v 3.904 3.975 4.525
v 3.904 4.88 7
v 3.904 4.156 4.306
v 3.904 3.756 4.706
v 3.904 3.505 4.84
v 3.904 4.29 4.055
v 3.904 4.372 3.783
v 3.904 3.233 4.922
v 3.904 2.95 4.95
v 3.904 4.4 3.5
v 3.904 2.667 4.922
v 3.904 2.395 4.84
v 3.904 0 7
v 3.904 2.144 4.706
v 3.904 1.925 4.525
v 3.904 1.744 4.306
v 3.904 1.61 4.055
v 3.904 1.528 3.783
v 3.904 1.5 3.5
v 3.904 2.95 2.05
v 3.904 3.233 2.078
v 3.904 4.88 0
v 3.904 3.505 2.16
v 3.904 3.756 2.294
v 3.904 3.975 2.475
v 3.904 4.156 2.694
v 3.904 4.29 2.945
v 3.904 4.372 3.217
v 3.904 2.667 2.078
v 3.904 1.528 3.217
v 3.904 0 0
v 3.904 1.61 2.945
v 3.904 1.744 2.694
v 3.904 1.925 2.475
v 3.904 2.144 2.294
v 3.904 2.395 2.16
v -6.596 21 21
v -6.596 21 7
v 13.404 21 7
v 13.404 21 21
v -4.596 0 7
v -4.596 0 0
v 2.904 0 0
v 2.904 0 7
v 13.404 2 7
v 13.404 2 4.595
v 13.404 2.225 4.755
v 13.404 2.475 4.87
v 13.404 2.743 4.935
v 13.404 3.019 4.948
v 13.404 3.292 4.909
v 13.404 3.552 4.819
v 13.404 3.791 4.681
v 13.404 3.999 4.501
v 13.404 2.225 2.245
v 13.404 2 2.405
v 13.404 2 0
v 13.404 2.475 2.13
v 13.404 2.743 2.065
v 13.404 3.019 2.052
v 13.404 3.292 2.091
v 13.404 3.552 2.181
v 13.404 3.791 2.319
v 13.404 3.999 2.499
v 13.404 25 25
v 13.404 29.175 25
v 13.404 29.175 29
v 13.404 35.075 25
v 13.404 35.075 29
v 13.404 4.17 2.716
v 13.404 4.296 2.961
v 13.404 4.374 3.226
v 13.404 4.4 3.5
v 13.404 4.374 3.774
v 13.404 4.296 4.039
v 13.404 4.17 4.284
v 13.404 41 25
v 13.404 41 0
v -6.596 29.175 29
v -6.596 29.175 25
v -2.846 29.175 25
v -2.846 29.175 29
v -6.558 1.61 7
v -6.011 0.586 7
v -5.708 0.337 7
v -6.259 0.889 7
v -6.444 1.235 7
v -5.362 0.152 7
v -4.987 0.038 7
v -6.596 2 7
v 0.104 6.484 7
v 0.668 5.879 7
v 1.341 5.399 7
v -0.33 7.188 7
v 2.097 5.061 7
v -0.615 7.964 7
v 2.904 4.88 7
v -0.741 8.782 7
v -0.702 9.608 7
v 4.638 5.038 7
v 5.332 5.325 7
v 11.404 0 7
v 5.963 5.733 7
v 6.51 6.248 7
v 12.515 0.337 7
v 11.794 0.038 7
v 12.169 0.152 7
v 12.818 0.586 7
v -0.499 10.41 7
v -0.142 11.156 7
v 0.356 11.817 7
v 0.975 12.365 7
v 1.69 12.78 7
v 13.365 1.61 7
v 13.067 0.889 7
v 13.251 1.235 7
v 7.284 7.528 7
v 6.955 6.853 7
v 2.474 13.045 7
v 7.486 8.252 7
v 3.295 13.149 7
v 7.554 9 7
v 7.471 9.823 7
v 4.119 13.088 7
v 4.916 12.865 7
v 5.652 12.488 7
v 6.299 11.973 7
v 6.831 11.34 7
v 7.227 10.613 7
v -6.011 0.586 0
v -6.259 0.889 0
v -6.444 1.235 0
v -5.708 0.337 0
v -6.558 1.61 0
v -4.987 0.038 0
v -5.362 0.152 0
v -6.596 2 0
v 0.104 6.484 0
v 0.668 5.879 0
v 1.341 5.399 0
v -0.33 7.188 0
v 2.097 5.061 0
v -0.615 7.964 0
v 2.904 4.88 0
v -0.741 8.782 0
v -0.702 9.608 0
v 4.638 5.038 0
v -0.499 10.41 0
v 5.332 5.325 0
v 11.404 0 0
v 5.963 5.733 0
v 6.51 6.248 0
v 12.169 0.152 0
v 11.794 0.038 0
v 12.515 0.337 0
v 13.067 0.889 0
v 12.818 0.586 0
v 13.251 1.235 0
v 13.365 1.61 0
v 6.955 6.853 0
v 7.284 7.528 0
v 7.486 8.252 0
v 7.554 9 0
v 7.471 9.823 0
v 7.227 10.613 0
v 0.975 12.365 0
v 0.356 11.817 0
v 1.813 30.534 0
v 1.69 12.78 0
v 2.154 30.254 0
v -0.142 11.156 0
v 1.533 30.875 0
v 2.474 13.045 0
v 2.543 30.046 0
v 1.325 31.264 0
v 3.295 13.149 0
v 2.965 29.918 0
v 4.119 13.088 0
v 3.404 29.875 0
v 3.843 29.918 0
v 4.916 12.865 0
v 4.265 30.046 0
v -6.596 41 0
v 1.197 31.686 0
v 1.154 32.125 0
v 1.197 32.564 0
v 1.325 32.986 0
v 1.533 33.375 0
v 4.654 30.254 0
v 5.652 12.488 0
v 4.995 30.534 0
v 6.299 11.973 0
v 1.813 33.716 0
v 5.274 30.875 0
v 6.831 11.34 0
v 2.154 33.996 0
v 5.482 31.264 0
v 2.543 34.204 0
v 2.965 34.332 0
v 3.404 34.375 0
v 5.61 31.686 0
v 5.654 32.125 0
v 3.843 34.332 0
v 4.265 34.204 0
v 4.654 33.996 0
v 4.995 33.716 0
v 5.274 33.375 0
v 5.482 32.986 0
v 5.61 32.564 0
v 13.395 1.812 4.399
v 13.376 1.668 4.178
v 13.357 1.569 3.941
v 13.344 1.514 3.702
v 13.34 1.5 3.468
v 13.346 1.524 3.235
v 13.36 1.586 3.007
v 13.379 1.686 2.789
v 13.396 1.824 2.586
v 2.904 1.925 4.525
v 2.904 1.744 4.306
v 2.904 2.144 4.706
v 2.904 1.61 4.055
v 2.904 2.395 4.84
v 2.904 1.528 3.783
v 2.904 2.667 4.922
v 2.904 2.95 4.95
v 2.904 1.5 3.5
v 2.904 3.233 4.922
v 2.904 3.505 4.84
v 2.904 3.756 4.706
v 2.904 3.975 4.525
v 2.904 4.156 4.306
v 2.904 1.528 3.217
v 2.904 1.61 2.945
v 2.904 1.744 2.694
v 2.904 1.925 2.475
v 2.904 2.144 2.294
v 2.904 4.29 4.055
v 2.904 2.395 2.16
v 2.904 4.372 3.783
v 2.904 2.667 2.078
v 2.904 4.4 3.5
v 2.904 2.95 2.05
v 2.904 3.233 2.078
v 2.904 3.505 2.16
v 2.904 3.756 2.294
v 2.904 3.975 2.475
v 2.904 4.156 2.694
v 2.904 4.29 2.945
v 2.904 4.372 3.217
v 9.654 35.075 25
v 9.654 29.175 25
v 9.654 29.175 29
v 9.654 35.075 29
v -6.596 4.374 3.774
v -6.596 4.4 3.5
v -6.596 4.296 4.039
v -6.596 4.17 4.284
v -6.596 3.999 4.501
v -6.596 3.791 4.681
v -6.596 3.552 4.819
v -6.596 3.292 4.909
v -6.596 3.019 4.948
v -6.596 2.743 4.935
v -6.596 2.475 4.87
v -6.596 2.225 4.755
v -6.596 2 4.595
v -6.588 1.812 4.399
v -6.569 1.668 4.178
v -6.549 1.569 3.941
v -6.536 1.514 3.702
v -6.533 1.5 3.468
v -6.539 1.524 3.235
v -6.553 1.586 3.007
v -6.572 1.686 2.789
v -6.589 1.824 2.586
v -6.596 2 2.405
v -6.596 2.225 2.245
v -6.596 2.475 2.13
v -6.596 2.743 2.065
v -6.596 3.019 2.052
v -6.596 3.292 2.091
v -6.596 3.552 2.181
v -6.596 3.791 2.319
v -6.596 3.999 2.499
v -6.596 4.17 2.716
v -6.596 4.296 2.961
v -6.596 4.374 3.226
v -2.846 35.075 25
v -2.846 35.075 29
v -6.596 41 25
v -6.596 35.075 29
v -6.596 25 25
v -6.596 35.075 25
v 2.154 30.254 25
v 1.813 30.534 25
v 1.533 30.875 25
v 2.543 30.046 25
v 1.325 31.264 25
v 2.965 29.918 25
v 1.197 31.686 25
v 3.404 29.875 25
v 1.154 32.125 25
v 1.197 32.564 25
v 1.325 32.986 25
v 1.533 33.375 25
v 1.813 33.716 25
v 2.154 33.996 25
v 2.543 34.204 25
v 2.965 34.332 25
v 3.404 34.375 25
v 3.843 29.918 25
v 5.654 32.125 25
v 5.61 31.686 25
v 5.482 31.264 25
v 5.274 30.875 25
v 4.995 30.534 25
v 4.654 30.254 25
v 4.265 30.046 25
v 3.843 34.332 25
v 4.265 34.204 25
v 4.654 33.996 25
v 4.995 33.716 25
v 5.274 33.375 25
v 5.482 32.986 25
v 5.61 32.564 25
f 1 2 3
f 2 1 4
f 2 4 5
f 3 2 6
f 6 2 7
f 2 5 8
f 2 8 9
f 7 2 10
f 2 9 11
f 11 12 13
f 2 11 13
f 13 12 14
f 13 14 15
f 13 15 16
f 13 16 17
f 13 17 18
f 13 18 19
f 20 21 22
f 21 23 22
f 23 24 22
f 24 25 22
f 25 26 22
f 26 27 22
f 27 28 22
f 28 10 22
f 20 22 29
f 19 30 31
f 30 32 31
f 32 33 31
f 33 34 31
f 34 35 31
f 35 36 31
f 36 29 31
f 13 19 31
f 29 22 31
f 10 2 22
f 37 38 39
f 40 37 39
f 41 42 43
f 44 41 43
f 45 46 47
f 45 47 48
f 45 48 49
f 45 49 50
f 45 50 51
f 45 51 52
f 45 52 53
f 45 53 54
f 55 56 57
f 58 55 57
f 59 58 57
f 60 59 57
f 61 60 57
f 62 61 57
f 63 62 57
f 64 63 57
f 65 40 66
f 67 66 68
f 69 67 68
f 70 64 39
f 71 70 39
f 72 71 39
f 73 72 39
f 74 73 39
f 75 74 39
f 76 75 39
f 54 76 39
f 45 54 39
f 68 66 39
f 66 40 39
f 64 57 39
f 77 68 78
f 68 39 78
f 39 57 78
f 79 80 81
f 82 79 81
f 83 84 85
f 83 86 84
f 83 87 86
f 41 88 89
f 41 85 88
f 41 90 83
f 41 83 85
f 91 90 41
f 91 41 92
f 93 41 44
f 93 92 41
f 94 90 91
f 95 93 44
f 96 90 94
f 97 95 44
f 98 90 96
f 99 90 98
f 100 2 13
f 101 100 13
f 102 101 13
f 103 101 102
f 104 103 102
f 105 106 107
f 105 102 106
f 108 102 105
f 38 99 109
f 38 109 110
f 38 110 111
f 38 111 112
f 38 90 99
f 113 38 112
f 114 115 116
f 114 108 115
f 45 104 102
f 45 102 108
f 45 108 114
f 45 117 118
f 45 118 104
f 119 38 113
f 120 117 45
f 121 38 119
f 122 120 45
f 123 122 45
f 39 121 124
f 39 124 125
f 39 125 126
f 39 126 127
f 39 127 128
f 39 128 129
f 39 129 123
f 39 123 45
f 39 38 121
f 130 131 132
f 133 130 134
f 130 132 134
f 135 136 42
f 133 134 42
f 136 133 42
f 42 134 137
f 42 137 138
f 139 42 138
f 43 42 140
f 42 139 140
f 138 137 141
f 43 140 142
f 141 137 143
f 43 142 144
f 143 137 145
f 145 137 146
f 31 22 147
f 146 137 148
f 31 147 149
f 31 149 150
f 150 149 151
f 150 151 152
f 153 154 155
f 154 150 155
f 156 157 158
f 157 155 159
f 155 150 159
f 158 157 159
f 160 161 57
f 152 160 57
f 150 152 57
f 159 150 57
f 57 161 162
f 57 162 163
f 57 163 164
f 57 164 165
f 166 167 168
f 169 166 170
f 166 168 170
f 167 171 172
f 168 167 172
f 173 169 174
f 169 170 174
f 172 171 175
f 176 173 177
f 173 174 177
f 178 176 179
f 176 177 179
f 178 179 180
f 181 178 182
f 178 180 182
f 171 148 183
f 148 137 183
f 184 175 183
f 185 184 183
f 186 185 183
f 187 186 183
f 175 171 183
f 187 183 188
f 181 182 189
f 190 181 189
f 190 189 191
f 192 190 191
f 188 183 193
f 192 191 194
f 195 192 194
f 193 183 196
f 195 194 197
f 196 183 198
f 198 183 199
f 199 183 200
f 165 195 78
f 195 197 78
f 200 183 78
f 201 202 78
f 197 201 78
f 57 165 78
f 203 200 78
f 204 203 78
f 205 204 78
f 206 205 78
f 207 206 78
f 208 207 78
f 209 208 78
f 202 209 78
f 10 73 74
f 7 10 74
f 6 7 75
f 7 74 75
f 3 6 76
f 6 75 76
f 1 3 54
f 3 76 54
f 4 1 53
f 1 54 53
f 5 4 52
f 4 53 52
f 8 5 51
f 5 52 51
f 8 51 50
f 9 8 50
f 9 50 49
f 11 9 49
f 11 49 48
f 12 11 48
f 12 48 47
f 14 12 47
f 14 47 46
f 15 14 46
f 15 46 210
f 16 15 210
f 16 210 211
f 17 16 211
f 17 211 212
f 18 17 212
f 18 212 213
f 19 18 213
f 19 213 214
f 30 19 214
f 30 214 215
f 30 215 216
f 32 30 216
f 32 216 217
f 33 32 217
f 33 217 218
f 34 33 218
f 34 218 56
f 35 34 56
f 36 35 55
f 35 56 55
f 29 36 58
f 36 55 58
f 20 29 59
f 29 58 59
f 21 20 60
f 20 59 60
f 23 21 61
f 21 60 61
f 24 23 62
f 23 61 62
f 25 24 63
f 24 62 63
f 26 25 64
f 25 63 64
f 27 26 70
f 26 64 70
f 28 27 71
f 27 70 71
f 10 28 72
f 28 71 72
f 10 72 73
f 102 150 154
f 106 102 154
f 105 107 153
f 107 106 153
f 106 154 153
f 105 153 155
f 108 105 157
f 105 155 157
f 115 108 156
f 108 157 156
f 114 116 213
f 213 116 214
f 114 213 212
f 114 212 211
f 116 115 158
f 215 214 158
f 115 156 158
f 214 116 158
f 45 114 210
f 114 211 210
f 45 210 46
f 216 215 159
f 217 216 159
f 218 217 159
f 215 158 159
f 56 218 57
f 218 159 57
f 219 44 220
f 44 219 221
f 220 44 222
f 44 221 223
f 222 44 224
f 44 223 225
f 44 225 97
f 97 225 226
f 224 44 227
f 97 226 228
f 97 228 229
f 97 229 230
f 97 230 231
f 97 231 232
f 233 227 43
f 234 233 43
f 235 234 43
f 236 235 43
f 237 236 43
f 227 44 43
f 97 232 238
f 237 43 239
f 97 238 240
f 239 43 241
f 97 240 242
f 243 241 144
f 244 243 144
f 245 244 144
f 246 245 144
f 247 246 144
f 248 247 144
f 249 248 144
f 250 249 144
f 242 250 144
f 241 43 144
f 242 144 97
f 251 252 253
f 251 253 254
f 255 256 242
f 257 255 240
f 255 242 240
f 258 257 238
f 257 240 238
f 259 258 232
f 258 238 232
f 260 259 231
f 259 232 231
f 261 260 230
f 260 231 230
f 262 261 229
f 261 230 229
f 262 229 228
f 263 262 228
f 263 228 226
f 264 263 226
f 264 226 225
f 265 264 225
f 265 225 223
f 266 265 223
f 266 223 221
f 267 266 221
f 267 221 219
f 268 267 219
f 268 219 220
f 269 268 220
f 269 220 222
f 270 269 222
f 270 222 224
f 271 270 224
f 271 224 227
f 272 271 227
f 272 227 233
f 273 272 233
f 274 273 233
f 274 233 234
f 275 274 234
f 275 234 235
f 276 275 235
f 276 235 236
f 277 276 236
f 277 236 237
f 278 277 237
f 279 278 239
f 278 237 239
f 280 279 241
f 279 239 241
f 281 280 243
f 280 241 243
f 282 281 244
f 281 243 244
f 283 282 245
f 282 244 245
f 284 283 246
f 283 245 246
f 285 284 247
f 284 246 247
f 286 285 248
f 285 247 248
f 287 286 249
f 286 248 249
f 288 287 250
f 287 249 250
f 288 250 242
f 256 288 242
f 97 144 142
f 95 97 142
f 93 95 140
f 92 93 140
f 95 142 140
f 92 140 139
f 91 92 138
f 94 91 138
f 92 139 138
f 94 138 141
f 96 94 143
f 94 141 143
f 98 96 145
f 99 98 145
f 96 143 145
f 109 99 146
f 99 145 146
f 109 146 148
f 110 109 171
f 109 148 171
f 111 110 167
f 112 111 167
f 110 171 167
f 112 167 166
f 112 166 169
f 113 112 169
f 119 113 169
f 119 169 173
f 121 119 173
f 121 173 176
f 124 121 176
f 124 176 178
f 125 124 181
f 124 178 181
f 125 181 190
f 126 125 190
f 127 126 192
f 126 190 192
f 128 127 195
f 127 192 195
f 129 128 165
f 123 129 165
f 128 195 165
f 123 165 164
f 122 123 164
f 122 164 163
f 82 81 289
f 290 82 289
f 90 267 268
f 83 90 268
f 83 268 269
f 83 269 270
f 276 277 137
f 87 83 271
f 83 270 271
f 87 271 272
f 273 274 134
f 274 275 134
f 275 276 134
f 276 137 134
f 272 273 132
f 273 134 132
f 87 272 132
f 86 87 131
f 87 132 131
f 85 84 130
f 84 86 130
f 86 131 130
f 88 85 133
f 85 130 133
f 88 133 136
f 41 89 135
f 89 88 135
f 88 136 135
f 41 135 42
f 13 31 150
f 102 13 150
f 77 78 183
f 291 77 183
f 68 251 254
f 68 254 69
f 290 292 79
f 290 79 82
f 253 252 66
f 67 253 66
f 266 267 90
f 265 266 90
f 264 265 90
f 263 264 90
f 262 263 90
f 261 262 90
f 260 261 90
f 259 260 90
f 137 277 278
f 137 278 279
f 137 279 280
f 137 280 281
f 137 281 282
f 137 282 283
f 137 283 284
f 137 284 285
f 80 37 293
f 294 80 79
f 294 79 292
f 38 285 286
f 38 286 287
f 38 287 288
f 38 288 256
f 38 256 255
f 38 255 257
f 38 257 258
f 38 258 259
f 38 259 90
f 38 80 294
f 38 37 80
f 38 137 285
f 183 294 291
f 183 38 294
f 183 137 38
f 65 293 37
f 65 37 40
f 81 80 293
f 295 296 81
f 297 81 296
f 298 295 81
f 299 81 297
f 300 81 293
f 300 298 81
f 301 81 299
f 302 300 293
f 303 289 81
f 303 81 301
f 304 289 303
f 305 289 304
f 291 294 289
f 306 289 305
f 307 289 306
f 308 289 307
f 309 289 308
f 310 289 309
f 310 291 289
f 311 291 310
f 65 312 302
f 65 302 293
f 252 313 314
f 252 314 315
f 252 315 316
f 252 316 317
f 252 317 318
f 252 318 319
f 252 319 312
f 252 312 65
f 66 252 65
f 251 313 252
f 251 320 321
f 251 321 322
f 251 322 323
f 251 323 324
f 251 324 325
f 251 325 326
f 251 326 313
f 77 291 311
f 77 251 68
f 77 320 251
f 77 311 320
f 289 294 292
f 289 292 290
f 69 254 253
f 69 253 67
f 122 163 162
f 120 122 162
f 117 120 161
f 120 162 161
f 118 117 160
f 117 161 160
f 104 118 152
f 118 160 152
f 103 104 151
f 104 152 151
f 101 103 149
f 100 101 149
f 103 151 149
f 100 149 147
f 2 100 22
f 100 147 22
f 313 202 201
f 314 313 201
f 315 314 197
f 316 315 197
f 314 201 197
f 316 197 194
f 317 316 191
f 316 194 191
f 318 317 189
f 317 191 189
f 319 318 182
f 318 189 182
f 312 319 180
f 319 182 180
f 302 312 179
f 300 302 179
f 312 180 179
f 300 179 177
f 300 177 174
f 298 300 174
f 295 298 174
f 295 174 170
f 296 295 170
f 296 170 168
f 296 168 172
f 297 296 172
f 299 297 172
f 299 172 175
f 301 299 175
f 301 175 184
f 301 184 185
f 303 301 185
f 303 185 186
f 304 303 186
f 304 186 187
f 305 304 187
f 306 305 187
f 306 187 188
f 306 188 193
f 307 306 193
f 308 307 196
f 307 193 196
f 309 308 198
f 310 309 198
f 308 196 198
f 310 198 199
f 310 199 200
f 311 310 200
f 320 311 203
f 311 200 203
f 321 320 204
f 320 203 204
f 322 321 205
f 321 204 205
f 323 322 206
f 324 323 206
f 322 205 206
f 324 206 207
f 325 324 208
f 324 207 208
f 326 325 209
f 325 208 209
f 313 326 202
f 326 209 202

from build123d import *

# Parameters (mm, degrees)
F1_DEPTH    = 7
F2_R        = 1.45
F3_DEPTH    = 25
F4_T1_DEPTH = 17
F5_DEPTH    = 25
F0_W        = 3.75
F0_H        = 5.9
F6_DEPTH    = 29
F7_SIZE     = 4


# Not quite as in the source:
# - a fillet or chamfer that OpenCascade refuses, or shapes differently, is made with other operations: its cross-section is extruded or revolved along the edge and cut away or added
# - a feature names something its author has since deleted; it is built from what else it names


with BuildPart() as f1:
    # F0 (on Top) → F1 (new body)
    with BuildSketch(Plane.XY):
        Polygon((-6.5963959517, 29.175), (-6.5963959517, 21), (13.4036040483, 21), (13.4036040483, 29.175), (9.6536040483, 29.175), (9.6536040483, 35.075), (13.4036040483, 35.075), (13.4036040483, 41), (-6.5963959517, 41), (-6.5963959517, 35.075), (-2.8463959517, 35.075), (-2.8463959517, 29.175), align=None)
        with BuildLine():
            ThreePointArc((1.1536040483, 32.125), (3.4036040483, 34.375), (5.6536040483, 32.125))
            ThreePointArc((5.6536040483, 32.125), (3.4036040483, 29.875), (1.1536040483, 32.125))
        make_face(mode=Mode.SUBTRACT)
        with BuildLine():
            Line((-6.5963959517, 21), (-6.5963959517, 0))
            Line((-6.5963959517, 0), (2.9036040483, 0))
            Line((2.9036040483, 0), (2.9036040483, 4.880230589))
            ThreePointArc((2.9036040483, 4.880230589), (0.6515593539, 12.1062437123), (7.5536040483, 9))
            ThreePointArc((7.5536040483, 9), (6.5098477606, 6.2479553056), (3.9036040483, 4.880230589))
            Line((3.9036040483, 4.880230589), (3.9036040483, 0))
            Line((3.9036040483, 0), (13.4036040483, 0))
            Line((13.4036040483, 0), (13.4036040483, 21))
            Line((13.4036040483, 21), (-6.5963959517, 21))
        make_face()
    extrude(amount=F1_DEPTH)

    # F2 (on face) → F3 (cut)
    with BuildSketch(Plane.YZ.offset(13.4036040483)):
        with Locations((2.95, 3.5)):
            Circle(F2_R)
    extrude(amount=-F3_DEPTH, mode=Mode.SUBTRACT)

    # F4: fillet of radius 2 on 2 edges, made by hand

    # F4_s2 → F4_t1 (cut)
    with BuildSketch(Plane.XY.offset(-5)):
        with BuildLine():
            ThreePointArc((11.4036040483, 0), (12.8178176107, 0.5857864376), (13.4036040483, 2))
            Line((13.4036040483, 2), (13.4036040483, 0))
            Line((13.4036040483, 0), (11.4036040483, 0))
        make_face()
        with BuildLine():
            ThreePointArc((-6.5963959517, 2), (-6.010609514, 0.5857864376), (-4.5963959517, 0))
            Line((-4.5963959517, 0), (-6.5963959517, 0))
            Line((-6.5963959517, 0), (-6.5963959517, 2))
        make_face()
    extrude(amount=F4_T1_DEPTH, mode=Mode.SUBTRACT)

    # F0 (on Top) → F5 (join)
    with BuildSketch(Plane.XY):
        Polygon((-6.5963959517, 29.175), (-6.5963959517, 21), (13.4036040483, 21), (13.4036040483, 29.175), (9.6536040483, 29.175), (9.6536040483, 35.075), (13.4036040483, 35.075), (13.4036040483, 41), (-6.5963959517, 41), (-6.5963959517, 35.075), (-2.8463959517, 35.075), (-2.8463959517, 29.175), align=None)
        with BuildLine():
            ThreePointArc((1.1536040483, 32.125), (3.4036040483, 34.375), (5.6536040483, 32.125))
            ThreePointArc((5.6536040483, 32.125), (3.4036040483, 29.875), (1.1536040483, 32.125))
        make_face(mode=Mode.SUBTRACT)
    extrude(amount=F5_DEPTH)

    # F0 (on Top) → F6 (join)
    with BuildSketch(Plane.XY):
        with Locations((-4.7213959517, 32.125)):
            Rectangle(F0_W, F0_H)
        with Locations((11.5286040483, 32.125)):
            Rectangle(F0_W, F0_H)
    extrude(amount=F6_DEPTH)

    # F7
    f7_edges = [f1.edges().sort_by_distance(p)[0] for p in [
        (3.403604, 21, 25),
    ]]
    chamfer(f7_edges, length=F7_SIZE)


solid = f1.part
